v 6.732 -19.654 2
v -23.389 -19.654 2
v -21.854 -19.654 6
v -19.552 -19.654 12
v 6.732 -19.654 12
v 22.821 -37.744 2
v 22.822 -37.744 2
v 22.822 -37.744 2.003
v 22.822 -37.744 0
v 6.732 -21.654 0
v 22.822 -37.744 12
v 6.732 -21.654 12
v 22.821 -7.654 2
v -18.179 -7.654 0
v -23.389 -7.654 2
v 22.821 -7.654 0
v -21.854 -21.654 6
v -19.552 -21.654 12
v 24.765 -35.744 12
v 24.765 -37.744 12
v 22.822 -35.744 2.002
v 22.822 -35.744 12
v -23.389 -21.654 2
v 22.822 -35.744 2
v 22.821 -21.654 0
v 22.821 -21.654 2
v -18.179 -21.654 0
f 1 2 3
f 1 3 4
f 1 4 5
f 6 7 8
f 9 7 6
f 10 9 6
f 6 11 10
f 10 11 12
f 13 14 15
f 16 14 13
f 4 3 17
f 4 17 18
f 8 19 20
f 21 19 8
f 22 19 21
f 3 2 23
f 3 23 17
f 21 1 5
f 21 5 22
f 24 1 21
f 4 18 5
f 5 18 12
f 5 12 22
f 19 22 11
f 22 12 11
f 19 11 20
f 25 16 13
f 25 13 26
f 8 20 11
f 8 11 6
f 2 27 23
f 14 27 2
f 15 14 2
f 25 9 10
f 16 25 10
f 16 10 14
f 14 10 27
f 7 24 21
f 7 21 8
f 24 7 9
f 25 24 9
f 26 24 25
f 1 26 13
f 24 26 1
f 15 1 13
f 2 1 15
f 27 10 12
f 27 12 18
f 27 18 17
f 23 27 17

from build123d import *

# Parameters (mm, degrees)
SKETCH1_W               = 69
SKETCH1_H               = 14
BOSS_EXTRUDE1_DEPTH     = 2
SKETCH2_W               = 52.910547302
SKETCH2_H               = 2
BOSS_EXTRUDE2_DEPTH     = 4
CUT_EXTRUDE1_DEPTH      = 20
CUT_EXTRUDE1_DEPTH_BACK = 20
CUT_EXTRUDE2_DEPTH      = 2
BOSS_EXTRUDE3_DEPTH     = 2
BOSS_EXTRUDE4_DEPTH     = 4
BOSS_EXTRUDE5_DEPTH     = 6
CUT_EXTRUDE3_DEPTH      = 6
BOSS_EXTRUDE6_START     = -16.09
BOSS_EXTRUDE6_DEPTH     = 2
CUT_EXTRUDE4_DEPTH      = 20
CUT_EXTRUDE4_DEPTH_BACK = 20
SKETCH11_W              = 60.759047224
SKETCH11_H              = 31.87532725


with BuildPart() as part:
    # Sketch1 → Boss-Extrude1 (new body)
    with BuildSketch(Plane.XY):
        with Locations((-11.678861789, -0.654471545)):
            Rectangle(SKETCH1_W, SKETCH1_H)
    extrude(amount=BOSS_EXTRUDE1_DEPTH)

    # Sketch2 → Boss-Extrude2 (add)
    with BuildSketch(Plane.XY.offset(2)):
        with Locations((-19.723588138, 5.345528455)):
            Rectangle(SKETCH2_W, SKETCH2_H)
    extrude(amount=BOSS_EXTRUDE2_DEPTH)

    # Sketch4 → Cut-Extrude1 (cut, two sides: drawn at the far end of the back side and taken through both)
    with BuildSketch(Plane(origin=(0, 6.345528455, 0), x_dir=(1, 0, 0), z_dir=(0, 1, 0)).offset(-CUT_EXTRUDE1_DEPTH_BACK)):
        Polygon((-18.178861789, 0), (-33.809396177, -6), (-46.178861789, -6), (-46.178861789, 0), align=None)
    extrude(amount=CUT_EXTRUDE1_DEPTH + CUT_EXTRUDE1_DEPTH_BACK, mode=Mode.SUBTRACT)

    # Sketch5 → Cut-Extrude2 (cut)
    with BuildSketch(Plane(origin=(0, 6.345528455, 0), x_dir=(1, 0, 0), z_dir=(0, 1, 0))):
        Polygon((-33.809396177, -6), (-23.38959077, -2.000211452), (-21.854215798, -6), align=None)
    extrude(amount=-CUT_EXTRUDE2_DEPTH, mode=Mode.SUBTRACT)

    # Sketch6 → Boss-Extrude3 (add)
    with BuildSketch(Plane.XY.offset(2)):
        Polygon((6.731685513, 6.345528455), (22.821685513, 22.435528455), (22.821138211, 6.345528455), align=None)
    extrude(amount=-BOSS_EXTRUDE3_DEPTH)

    # Sketch7 → Boss-Extrude4 (add)
    with BuildSketch(Plane.XY.offset(2)):
        Polygon((6.731685513, 4.345528455), (22.821617483, 20.435528456), (22.821685513, 22.435528455), (6.731685513, 6.345528455), align=None)
    extrude(amount=BOSS_EXTRUDE4_DEPTH)

    # Sketch8 → Boss-Extrude5 (add)
    with BuildSketch(Plane.XY.offset(6)):
        Polygon((22.821685513, 22.435528455), (6.731685513, 6.345528455), (-21.854215798, 6.345528455), (-21.854215798, 4.345528455), (6.731685513, 4.345528455), (22.821617483, 20.435528456), align=None)
    extrude(amount=BOSS_EXTRUDE5_DEPTH)

    # Sketch9 → Cut-Extrude3 (cut)
    with BuildSketch(Plane.XZ.offset(-4.345528455)):
        Polygon((-23.389039918, 2), (-21.854215798, 6), (-19.551979619, 12), (-21.854215798, 12), align=None)
    extrude(amount=-CUT_EXTRUDE3_DEPTH, mode=Mode.SUBTRACT)


with BuildPart() as cut_extrude3_piece_1:
    # of the separate pieces the step leaves, piece 1, a body of its own (cut_extrude3_pieces)
    add(part.part.solids().sort_by_distance((-18.178861789, 6.345528455, 0))[0])

    # Sketch10 → Boss-Extrude6 (add)
    with BuildSketch(Plane.XZ.offset(-4.345528455).offset(BOSS_EXTRUDE6_START)):
        Polygon((22.821617483, 12), (24.765438688, 12), (22.821138211, 2), align=None)
    extrude(amount=-BOSS_EXTRUDE6_DEPTH)


with BuildPart() as cut_extrude3_piece_2:
    # of the separate pieces the step leaves, piece 2, a body of its own (cut_extrude3_pieces)
    add(part.part.solids().sort_by_distance((-23.38861886, 6.345528455, 2.002743364))[0])


with BuildPart() as body_3:
    # Mirror1: mirrored copy
    add(cut_extrude3_piece_1.part.mirror(Plane(origin=(-46.178861789, -7.654471545, 2), x_dir=(0, 0, 1), z_dir=(0, 1, 0))))


with BuildPart() as cut_extrude4_tool:
    # Sketch11 → Cut-Extrude4 (new, two sides: drawn at the far end of the back side and taken through both)
    with BuildSketch(Plane.XY.offset(2).offset(-CUT_EXTRUDE4_DEPTH_BACK)):
        with Locations((3.114590222, 8.28319208)):
            Rectangle(SKETCH11_W, SKETCH11_H)
    extrude(amount=CUT_EXTRUDE4_DEPTH + CUT_EXTRUDE4_DEPTH_BACK)


with BuildPart() as cut_extrude3_piece_1_1:
    add(cut_extrude3_piece_1.part)

    # Cut-Extrude4: cut by cut_extrude4_tool
    add(cut_extrude4_tool.part, mode=Mode.SUBTRACT)


with BuildPart() as cut_extrude3_piece_2_1:
    add(cut_extrude3_piece_2.part)

    # Cut-Extrude4: cut by cut_extrude4_tool
    add(cut_extrude4_tool.part, mode=Mode.SUBTRACT)


solid = body_3.part
